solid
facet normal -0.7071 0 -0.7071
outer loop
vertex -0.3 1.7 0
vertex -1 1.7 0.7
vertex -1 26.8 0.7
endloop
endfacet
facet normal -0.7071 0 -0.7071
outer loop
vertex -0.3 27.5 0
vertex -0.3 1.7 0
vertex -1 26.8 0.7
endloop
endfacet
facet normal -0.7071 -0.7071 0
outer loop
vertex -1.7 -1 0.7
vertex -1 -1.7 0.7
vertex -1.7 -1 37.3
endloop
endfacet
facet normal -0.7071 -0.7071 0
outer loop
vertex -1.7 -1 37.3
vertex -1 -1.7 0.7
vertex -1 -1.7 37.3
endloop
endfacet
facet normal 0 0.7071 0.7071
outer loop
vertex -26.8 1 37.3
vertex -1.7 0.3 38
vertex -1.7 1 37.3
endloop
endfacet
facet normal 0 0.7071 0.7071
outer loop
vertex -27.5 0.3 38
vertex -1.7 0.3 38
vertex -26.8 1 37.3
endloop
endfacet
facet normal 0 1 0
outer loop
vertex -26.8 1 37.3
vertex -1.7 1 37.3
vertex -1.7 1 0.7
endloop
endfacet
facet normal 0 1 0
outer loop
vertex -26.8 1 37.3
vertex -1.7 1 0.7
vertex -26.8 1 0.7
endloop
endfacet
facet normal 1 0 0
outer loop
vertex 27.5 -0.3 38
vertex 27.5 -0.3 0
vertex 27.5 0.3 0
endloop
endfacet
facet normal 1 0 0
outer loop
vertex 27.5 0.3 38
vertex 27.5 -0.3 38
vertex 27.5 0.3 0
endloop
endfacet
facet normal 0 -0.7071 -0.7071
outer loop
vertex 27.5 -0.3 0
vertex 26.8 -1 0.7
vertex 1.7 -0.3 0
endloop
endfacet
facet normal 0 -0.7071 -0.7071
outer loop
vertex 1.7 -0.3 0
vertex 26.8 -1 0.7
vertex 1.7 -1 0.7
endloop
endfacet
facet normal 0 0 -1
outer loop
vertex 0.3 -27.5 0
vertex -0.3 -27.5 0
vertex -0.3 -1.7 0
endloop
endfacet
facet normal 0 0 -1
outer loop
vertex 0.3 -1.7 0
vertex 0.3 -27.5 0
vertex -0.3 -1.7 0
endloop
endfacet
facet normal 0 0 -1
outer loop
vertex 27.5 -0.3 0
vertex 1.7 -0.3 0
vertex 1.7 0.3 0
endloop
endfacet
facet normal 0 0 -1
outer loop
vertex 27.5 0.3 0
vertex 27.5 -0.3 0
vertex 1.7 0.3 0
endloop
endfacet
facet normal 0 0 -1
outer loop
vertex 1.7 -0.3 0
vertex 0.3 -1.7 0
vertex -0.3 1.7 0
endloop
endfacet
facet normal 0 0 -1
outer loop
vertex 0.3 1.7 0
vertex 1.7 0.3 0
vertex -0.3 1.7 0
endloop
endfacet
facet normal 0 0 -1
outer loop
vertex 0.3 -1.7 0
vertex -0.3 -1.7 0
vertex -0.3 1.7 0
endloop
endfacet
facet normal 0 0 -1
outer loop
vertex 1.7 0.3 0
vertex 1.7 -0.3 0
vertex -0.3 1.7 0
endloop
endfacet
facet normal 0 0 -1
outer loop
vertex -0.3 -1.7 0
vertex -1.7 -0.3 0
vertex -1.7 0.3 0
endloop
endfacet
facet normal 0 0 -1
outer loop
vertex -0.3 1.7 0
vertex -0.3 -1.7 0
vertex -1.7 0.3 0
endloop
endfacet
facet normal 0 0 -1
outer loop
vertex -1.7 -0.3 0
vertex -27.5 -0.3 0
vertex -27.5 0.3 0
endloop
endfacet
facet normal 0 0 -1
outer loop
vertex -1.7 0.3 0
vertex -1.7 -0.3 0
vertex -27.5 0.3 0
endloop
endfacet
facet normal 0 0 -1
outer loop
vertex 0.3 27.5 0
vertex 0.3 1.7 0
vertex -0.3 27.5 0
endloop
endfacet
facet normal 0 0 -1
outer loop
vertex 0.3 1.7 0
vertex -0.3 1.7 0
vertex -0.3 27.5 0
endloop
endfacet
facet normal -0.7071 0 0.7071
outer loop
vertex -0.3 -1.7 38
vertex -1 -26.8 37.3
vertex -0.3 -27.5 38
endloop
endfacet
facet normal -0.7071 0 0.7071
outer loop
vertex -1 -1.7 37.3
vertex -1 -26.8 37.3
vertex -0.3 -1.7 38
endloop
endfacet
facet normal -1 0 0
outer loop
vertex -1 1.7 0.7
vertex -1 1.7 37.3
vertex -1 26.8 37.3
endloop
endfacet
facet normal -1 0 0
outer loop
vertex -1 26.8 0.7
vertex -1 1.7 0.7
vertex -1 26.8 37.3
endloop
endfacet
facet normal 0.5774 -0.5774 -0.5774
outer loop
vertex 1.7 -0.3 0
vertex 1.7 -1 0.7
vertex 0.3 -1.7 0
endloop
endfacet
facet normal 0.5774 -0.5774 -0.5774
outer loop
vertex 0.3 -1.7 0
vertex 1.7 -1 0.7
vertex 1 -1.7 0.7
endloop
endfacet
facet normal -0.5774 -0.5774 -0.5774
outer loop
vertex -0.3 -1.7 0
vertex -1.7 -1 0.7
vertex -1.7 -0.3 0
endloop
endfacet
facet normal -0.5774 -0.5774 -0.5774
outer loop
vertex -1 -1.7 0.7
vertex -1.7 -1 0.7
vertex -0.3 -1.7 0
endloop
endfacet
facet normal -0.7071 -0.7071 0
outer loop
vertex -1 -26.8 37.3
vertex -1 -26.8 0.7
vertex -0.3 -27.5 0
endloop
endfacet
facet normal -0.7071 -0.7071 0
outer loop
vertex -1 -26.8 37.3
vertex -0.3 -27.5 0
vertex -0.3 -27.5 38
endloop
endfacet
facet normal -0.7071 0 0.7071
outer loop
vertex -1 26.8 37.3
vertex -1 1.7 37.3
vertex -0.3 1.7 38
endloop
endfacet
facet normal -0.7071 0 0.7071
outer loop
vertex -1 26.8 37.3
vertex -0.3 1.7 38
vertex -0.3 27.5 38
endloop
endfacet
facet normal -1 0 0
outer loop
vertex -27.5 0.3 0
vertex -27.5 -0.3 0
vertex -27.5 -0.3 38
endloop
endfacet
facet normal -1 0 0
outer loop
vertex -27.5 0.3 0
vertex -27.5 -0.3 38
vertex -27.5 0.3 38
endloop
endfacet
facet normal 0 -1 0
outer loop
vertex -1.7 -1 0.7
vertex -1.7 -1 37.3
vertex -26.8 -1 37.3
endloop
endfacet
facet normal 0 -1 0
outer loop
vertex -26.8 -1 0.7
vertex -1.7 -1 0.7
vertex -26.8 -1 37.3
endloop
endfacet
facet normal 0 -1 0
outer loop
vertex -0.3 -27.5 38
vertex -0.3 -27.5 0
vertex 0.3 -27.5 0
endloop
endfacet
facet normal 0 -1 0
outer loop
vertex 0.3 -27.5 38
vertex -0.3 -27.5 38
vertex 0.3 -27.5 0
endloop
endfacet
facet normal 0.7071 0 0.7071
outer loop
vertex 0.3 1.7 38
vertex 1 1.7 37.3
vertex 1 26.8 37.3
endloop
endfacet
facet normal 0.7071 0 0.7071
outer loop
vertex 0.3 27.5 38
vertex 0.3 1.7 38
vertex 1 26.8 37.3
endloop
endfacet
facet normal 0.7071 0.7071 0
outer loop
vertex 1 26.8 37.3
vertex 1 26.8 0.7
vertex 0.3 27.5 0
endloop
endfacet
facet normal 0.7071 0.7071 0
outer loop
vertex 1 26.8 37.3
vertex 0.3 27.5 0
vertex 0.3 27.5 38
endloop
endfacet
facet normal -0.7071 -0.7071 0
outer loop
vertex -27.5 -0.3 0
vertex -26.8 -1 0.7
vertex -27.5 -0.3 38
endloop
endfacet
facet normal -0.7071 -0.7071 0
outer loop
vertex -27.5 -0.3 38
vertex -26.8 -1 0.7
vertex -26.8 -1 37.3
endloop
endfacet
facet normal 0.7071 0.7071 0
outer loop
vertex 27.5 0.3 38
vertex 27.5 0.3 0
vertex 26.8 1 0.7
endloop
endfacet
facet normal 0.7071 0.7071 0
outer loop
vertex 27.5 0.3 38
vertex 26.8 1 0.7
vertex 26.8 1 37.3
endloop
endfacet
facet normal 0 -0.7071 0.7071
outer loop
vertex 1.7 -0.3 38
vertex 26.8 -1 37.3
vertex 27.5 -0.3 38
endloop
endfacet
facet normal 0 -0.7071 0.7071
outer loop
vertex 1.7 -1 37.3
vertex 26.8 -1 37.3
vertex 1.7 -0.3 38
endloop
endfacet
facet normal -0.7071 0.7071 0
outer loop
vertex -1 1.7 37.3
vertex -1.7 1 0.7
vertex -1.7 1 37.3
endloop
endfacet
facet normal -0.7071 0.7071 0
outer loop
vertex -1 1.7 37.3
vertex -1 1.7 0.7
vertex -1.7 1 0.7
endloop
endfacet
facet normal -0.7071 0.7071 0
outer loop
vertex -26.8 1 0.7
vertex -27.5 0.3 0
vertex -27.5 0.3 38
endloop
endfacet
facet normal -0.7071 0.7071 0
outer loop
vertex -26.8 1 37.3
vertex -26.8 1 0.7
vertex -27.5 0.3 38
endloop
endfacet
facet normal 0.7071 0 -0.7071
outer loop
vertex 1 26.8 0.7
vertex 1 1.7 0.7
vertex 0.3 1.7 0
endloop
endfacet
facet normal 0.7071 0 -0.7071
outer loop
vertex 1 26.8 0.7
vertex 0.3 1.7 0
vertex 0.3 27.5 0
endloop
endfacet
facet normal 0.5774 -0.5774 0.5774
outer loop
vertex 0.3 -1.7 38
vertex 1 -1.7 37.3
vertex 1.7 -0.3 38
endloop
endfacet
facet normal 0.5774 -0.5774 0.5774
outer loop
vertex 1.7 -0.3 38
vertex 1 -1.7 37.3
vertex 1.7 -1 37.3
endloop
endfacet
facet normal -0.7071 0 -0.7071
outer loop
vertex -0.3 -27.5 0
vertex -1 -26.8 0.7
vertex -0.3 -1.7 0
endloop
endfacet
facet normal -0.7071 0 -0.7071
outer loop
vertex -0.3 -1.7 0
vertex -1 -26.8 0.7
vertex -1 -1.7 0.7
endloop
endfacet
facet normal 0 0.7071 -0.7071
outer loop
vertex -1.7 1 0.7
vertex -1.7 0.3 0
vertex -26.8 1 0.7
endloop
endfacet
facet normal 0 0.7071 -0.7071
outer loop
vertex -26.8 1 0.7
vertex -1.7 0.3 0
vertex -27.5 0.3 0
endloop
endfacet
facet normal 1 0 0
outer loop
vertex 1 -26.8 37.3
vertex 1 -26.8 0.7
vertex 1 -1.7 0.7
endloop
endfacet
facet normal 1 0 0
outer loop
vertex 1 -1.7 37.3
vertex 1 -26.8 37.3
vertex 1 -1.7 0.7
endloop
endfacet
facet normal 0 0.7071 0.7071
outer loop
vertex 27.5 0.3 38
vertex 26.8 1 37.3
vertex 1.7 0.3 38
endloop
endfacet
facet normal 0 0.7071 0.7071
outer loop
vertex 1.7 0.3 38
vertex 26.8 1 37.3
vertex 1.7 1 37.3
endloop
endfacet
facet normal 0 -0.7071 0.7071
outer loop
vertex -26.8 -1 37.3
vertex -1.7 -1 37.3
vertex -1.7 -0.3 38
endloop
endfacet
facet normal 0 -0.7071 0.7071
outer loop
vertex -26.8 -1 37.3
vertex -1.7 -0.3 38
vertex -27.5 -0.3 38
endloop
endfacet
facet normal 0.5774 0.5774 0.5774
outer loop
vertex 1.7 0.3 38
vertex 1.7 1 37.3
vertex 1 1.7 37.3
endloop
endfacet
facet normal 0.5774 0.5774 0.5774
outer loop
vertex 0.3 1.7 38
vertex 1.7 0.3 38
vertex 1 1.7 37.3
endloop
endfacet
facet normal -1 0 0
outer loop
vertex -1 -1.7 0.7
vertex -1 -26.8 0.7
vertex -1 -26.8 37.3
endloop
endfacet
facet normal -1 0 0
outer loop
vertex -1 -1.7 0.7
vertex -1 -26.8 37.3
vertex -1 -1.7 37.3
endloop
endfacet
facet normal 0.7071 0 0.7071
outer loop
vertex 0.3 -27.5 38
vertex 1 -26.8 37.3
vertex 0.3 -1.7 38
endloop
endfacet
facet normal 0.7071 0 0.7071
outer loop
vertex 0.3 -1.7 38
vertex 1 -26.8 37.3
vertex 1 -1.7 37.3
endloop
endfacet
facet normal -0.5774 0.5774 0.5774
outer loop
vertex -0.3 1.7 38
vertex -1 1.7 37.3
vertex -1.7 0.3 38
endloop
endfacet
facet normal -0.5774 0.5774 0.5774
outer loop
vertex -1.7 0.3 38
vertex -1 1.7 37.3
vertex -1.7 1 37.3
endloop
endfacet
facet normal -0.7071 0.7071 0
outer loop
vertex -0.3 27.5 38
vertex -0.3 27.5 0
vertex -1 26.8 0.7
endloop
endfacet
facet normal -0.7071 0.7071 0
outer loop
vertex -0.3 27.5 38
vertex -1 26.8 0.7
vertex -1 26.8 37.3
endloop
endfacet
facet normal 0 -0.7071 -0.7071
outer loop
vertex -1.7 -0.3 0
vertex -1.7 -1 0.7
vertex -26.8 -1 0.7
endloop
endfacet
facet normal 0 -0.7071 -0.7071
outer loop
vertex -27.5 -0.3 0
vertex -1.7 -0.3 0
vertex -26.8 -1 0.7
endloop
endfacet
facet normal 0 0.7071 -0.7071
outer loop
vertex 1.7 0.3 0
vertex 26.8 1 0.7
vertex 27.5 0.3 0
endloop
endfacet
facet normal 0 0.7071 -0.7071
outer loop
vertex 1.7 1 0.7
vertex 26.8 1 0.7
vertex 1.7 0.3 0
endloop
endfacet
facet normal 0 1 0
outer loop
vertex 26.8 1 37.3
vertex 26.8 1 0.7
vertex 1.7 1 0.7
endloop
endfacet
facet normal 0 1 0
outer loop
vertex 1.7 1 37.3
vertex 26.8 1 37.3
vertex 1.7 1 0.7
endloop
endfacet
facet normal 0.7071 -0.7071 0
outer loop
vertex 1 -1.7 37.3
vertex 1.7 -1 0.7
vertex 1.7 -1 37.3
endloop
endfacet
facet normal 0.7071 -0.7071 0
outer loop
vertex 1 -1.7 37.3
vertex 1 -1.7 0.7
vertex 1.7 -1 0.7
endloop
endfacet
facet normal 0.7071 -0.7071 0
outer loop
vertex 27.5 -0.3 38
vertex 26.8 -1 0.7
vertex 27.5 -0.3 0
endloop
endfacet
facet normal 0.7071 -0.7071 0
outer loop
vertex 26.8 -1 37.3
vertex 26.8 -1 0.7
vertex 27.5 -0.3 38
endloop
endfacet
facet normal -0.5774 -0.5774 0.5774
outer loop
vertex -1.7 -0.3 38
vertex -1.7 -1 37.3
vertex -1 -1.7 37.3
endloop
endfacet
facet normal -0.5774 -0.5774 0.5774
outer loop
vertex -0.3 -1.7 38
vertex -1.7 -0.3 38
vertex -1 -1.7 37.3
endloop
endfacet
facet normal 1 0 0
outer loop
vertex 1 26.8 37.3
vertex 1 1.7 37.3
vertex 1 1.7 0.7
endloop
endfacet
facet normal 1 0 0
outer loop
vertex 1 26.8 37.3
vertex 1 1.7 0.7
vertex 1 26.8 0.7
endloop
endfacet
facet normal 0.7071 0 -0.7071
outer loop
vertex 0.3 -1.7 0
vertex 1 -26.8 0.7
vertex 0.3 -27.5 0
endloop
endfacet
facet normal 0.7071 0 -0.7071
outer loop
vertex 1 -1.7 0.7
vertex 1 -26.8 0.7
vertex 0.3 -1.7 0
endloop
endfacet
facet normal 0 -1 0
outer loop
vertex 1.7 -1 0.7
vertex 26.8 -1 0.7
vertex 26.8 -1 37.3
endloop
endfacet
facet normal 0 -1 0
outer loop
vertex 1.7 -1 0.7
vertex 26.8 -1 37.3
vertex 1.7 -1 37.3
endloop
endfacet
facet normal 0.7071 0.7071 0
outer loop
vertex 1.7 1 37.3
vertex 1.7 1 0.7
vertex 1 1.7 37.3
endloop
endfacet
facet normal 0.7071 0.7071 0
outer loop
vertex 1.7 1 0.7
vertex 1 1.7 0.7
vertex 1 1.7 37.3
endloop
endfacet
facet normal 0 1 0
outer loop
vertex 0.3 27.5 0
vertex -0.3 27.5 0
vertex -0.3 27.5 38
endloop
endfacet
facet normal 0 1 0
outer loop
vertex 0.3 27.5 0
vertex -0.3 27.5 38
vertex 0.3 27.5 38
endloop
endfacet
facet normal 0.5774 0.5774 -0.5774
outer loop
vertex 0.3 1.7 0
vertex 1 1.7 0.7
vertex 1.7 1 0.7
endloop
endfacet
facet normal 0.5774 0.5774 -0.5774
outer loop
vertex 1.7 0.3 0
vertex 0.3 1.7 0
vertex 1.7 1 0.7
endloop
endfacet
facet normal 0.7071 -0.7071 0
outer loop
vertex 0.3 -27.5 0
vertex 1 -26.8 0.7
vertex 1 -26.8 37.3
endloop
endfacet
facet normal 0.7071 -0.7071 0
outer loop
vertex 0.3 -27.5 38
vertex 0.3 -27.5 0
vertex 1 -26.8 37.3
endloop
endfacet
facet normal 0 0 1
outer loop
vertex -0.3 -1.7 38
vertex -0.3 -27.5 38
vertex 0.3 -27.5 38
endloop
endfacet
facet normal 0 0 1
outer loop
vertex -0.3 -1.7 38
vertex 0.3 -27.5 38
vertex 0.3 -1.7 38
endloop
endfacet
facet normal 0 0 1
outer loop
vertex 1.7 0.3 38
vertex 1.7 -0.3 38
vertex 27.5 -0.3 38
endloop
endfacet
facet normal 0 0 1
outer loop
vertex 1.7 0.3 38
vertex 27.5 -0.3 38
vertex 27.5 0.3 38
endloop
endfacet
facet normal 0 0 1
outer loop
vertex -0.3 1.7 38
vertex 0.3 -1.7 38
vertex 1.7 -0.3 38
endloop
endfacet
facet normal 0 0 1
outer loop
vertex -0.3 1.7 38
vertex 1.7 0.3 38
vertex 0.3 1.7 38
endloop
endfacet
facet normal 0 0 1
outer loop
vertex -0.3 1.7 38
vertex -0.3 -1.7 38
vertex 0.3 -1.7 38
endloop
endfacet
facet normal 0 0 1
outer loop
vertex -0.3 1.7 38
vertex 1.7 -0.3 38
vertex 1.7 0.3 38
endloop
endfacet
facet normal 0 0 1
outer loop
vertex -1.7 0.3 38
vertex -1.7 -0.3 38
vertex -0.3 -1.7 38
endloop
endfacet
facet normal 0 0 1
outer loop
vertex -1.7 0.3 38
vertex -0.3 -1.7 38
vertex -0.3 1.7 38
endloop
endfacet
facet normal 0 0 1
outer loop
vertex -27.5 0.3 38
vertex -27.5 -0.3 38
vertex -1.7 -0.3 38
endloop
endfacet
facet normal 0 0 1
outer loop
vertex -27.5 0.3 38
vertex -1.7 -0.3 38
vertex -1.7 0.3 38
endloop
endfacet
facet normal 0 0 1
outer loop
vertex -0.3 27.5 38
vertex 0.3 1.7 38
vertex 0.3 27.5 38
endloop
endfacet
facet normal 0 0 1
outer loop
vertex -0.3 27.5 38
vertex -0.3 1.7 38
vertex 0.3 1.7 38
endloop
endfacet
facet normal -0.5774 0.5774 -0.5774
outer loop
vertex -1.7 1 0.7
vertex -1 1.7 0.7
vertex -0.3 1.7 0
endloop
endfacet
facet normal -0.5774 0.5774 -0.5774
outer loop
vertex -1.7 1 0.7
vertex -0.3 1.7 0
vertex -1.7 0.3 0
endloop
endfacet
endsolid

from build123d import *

# Parameters (mm, degrees)
F0_W     = 2
F0_H     = 55
F1_DEPTH = 38
F7_COUNT = 4
F9_SIZE  = 0.7


with BuildPart() as f1:
    # F0 (on Top) → F1 (new body)
    with BuildSketch(Plane.XY):
        with Locations((-1, 27.5)):
            Rectangle(F0_W, F0_H)
    extrude(amount=F1_DEPTH)


with BuildPart() as f1_1:
    # F3: moved
    add(f1.part.moved(Location((1, 0, 0))))


with BuildPart() as f1_2:
    # F5: moved
    add(f1_1.part.moved(Location((0, -27.5, 0))))


with BuildPart() as f7_1:
    # F7: instance of F1
    add(f1_2.part.rotate(Axis((0, 0, 29.2499251664), (0, 0, 1)), 1 * 360 / F7_COUNT))


with BuildPart() as f7_2:
    # F7: instance of F1
    add(f1_2.part.rotate(Axis((0, 0, 29.2499251664), (0, 0, 1)), 2 * 360 / F7_COUNT))


with BuildPart() as f7_3:
    # F7: instance of F1
    add(f1_2.part.rotate(Axis((0, 0, 29.2499251664), (0, 0, 1)), 3 * 360 / F7_COUNT))


with BuildPart() as f1_3:
    add(f1_2.part)

    # F8: union F7_1, F7_2, F7_3
    add(f7_1.part)
    add(f7_2.part)
    add(f7_3.part)

    # F9
    f9_edges = [f1_3.edges().sort_by_distance(p)[0] for p in [
        (14.25, 1, 0),
        (1, 1, 19),
        (14.25, 1, 38),
        (27.5, 1, 19),
        (1, 14.25, 0),
        (1, 27.5, 19),
        (1, 14.25, 38),
        (-14.25, 1, 0),
        (-27.5, 1, 19),
        (-14.25, 1, 38),
        (-1, 1, 19),
        (-1, 14.25, 0),
        (-1, 14.25, 38),
        (-1, 27.5, 19),
        (-1, -14.25, 0),
        (-1, -27.5, 19),
        (-1, -14.25, 38),
        (-1, -1, 19),
        (-14.25, -1, 0),
        (-14.25, -1, 38),
        (-27.5, -1, 19),
        (1, -14.25, 0),
        (1, -1, 19),
        (1, -14.25, 38),
        (1, -27.5, 19),
        (14.25, -1, 0),
        (27.5, -1, 19),
        (14.25, -1, 38),
    ]]
    chamfer(f9_edges, length=F9_SIZE)


solid = f1_3.part
